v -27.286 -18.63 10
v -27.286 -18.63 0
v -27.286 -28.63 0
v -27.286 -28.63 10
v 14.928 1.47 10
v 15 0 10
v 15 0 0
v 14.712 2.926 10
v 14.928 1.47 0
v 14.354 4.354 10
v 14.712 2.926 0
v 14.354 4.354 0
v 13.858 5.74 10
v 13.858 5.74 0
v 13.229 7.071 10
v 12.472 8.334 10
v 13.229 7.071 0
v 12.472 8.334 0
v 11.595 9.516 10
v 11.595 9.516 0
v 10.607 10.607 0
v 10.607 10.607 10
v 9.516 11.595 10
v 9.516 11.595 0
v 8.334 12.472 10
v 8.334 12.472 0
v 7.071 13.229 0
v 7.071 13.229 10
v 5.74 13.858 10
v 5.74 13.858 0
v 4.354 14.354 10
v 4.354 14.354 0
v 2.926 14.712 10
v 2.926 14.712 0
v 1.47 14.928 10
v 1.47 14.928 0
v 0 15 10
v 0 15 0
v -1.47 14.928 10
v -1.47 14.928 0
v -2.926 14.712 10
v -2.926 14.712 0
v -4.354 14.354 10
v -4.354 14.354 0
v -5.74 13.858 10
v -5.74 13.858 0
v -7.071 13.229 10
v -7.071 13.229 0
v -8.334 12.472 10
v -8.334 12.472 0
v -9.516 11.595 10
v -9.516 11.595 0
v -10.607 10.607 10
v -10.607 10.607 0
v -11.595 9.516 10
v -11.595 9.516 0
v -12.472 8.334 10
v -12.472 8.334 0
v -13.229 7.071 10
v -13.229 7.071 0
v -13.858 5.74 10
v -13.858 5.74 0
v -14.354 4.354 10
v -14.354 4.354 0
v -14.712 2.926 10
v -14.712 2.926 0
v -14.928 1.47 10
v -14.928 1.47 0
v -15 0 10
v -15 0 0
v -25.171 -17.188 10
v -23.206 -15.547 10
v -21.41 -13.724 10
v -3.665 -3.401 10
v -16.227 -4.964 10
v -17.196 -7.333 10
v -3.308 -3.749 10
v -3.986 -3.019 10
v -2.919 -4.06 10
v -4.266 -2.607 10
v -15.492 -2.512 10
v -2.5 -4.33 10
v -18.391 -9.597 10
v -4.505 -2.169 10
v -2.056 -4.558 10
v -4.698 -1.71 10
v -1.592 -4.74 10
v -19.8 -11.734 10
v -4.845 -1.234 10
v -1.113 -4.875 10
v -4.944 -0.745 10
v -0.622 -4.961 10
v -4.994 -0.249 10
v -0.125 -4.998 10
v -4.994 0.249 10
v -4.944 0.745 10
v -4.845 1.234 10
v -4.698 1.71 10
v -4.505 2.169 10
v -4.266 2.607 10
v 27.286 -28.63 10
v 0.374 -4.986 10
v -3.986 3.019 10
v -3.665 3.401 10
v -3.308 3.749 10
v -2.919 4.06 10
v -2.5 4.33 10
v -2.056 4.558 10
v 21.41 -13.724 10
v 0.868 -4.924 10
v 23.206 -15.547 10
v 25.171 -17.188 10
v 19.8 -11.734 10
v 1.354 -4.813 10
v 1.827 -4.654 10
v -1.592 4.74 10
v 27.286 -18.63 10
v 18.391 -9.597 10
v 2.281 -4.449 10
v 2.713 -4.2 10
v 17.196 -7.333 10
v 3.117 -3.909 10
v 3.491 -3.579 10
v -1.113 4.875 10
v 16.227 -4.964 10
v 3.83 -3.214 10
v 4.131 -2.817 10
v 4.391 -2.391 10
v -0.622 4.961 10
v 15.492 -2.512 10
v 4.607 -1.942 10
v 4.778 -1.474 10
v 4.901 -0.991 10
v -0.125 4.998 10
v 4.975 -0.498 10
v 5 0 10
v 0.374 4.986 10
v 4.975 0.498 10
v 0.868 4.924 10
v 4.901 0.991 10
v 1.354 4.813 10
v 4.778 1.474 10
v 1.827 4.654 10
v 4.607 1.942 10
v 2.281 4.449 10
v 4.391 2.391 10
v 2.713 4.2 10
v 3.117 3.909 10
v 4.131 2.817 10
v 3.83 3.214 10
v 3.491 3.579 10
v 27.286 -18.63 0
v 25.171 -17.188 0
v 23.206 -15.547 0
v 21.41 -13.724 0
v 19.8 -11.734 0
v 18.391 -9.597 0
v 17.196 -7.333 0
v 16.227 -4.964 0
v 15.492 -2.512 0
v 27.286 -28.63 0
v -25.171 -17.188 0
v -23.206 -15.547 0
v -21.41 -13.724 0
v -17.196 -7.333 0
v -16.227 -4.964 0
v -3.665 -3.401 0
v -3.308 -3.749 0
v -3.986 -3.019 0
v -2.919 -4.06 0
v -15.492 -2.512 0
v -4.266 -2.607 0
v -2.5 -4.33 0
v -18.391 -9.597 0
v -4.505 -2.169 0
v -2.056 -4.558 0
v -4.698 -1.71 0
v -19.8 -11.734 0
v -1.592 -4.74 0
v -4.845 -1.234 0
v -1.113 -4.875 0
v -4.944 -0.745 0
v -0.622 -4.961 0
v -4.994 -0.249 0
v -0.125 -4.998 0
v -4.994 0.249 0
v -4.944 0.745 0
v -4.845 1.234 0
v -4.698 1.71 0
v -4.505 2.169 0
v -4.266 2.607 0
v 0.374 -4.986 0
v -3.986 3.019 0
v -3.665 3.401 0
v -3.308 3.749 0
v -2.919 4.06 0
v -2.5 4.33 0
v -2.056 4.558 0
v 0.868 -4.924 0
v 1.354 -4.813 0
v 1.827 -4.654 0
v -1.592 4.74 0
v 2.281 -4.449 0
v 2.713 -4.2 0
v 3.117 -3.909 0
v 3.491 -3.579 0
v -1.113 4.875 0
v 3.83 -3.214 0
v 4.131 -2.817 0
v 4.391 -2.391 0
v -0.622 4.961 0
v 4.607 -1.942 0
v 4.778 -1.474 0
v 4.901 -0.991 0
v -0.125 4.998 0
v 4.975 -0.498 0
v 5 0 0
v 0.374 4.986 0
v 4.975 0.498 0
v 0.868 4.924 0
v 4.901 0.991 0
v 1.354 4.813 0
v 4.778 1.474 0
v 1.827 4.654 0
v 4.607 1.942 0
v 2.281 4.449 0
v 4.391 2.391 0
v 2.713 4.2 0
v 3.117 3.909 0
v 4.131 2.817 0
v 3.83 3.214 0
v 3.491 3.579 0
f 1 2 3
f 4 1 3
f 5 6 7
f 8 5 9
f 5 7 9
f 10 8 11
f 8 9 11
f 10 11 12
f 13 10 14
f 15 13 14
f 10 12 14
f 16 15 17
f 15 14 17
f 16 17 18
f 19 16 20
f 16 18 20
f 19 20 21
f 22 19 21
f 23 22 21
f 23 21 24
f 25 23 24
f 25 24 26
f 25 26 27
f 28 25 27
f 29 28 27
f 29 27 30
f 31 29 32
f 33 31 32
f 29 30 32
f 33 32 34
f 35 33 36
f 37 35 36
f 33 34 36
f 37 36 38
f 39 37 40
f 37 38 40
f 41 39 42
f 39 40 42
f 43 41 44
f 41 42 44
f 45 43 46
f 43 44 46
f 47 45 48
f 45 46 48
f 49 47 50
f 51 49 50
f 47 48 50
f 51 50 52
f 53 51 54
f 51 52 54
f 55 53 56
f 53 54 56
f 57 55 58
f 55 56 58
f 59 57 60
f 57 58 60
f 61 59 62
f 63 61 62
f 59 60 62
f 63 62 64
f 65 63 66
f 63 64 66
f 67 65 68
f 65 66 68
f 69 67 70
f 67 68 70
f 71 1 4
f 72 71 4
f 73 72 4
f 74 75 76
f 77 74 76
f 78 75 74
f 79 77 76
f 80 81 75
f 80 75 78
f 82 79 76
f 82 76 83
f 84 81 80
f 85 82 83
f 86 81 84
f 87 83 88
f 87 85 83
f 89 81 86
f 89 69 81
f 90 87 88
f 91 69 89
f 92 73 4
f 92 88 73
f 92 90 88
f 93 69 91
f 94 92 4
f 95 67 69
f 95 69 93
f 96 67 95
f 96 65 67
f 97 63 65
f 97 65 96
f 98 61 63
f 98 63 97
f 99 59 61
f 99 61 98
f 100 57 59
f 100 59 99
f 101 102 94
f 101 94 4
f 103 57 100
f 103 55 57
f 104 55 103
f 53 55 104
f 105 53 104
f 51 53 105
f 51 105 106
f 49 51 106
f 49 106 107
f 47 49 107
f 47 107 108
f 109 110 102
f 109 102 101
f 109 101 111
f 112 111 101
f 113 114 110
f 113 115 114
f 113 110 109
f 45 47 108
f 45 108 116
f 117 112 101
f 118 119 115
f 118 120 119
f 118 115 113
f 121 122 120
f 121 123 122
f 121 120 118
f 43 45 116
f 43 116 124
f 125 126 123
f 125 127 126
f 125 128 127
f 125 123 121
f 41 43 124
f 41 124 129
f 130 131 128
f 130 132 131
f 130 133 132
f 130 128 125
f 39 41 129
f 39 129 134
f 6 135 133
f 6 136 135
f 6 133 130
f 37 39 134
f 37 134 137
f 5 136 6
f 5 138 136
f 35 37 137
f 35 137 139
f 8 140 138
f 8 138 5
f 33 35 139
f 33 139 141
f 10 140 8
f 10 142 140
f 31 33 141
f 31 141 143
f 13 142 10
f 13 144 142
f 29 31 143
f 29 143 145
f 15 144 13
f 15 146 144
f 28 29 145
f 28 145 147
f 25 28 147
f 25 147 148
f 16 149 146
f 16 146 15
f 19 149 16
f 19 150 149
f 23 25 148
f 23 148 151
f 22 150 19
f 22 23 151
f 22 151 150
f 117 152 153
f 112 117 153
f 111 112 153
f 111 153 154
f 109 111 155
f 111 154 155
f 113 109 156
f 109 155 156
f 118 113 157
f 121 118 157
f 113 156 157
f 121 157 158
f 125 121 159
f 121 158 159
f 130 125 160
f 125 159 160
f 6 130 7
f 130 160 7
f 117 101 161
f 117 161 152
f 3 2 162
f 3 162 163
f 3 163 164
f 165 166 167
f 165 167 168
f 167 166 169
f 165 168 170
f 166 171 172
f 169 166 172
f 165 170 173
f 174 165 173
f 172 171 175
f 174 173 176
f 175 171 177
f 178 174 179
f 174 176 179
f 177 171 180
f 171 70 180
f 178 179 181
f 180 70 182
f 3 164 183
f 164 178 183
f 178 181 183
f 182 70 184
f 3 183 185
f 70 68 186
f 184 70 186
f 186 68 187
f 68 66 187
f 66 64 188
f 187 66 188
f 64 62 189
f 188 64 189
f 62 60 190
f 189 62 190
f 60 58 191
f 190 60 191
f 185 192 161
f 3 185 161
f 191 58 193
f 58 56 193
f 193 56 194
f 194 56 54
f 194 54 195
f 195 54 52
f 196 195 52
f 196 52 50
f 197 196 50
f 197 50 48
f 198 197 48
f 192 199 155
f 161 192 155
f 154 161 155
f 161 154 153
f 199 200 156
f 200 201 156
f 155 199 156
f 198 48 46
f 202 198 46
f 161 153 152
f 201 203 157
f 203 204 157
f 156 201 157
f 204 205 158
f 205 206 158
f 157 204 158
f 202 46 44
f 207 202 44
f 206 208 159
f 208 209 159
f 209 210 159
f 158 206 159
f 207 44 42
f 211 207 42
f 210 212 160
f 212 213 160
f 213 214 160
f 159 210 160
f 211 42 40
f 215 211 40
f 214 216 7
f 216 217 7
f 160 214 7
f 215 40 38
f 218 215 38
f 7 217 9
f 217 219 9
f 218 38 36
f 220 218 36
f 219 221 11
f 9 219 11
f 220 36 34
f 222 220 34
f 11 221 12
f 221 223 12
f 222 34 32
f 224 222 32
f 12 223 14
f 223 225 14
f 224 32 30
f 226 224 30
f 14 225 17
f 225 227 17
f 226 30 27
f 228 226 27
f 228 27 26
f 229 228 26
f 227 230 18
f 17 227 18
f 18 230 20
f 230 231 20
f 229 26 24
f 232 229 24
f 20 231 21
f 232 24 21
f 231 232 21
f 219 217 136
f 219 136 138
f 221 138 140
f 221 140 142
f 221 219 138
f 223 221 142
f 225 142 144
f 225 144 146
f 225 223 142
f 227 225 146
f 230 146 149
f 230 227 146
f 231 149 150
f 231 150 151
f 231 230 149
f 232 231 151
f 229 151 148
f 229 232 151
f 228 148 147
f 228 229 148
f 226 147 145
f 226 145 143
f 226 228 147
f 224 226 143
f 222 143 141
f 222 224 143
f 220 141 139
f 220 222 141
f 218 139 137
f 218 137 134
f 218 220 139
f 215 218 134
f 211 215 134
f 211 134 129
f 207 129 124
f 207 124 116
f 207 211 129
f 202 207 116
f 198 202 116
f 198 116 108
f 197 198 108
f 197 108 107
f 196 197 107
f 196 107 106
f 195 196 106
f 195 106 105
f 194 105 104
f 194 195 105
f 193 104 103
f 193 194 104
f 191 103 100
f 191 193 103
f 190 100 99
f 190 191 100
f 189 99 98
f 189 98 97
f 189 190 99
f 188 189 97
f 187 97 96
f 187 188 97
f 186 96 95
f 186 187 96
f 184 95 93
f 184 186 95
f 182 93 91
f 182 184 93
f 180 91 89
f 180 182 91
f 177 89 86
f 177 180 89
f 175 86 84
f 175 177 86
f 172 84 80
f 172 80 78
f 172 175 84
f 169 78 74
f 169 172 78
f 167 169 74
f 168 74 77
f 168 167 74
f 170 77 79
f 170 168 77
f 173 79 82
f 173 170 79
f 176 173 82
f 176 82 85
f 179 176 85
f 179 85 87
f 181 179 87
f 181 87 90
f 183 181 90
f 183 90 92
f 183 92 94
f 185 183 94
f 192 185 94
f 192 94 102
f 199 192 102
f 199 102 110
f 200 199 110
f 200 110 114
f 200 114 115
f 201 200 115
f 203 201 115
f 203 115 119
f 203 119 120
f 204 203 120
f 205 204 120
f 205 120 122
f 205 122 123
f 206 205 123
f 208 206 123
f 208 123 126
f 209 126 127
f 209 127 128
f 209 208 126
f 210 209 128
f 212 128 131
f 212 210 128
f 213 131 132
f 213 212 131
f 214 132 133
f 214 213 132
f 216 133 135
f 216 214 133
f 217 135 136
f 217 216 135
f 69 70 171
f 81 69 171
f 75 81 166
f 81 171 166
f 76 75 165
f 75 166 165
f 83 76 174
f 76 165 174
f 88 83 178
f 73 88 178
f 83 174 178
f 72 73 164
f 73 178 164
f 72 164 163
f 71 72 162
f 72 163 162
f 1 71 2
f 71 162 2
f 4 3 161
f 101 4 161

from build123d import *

# Parameters (mm, degrees)
ESBO_O1_R                = 5
RESSALTO_EXTRUS_O1_DEPTH = 10


with BuildPart() as part:
    # Esboço1 → Ressalto-extrusão1 (new body)
    with BuildSketch(Plane.XY):
        with BuildLine():
            Line((-27.286144523, -18.629908028), (-27.286144523, -28.629908028))
            Line((-27.286144523, -28.629908028), (27.286144523, -28.629908028))
            Line((27.286144523, -28.629908028), (27.286144523, -18.629908028))
            ThreePointArc((27.286144523, -18.629908028), (19.069349751, -10.682542862), (15, 0))
            ThreePointArc((15, 0), (0, 15), (-15, 0))
            ThreePointArc((-15, 0), (-19.069349751, -10.682542862), (-27.286144523, -18.629908028))
        make_face()
        Circle(ESBO_O1_R, mode=Mode.SUBTRACT)
    extrude(amount=RESSALTO_EXTRUS_O1_DEPTH)


solid = part.part
